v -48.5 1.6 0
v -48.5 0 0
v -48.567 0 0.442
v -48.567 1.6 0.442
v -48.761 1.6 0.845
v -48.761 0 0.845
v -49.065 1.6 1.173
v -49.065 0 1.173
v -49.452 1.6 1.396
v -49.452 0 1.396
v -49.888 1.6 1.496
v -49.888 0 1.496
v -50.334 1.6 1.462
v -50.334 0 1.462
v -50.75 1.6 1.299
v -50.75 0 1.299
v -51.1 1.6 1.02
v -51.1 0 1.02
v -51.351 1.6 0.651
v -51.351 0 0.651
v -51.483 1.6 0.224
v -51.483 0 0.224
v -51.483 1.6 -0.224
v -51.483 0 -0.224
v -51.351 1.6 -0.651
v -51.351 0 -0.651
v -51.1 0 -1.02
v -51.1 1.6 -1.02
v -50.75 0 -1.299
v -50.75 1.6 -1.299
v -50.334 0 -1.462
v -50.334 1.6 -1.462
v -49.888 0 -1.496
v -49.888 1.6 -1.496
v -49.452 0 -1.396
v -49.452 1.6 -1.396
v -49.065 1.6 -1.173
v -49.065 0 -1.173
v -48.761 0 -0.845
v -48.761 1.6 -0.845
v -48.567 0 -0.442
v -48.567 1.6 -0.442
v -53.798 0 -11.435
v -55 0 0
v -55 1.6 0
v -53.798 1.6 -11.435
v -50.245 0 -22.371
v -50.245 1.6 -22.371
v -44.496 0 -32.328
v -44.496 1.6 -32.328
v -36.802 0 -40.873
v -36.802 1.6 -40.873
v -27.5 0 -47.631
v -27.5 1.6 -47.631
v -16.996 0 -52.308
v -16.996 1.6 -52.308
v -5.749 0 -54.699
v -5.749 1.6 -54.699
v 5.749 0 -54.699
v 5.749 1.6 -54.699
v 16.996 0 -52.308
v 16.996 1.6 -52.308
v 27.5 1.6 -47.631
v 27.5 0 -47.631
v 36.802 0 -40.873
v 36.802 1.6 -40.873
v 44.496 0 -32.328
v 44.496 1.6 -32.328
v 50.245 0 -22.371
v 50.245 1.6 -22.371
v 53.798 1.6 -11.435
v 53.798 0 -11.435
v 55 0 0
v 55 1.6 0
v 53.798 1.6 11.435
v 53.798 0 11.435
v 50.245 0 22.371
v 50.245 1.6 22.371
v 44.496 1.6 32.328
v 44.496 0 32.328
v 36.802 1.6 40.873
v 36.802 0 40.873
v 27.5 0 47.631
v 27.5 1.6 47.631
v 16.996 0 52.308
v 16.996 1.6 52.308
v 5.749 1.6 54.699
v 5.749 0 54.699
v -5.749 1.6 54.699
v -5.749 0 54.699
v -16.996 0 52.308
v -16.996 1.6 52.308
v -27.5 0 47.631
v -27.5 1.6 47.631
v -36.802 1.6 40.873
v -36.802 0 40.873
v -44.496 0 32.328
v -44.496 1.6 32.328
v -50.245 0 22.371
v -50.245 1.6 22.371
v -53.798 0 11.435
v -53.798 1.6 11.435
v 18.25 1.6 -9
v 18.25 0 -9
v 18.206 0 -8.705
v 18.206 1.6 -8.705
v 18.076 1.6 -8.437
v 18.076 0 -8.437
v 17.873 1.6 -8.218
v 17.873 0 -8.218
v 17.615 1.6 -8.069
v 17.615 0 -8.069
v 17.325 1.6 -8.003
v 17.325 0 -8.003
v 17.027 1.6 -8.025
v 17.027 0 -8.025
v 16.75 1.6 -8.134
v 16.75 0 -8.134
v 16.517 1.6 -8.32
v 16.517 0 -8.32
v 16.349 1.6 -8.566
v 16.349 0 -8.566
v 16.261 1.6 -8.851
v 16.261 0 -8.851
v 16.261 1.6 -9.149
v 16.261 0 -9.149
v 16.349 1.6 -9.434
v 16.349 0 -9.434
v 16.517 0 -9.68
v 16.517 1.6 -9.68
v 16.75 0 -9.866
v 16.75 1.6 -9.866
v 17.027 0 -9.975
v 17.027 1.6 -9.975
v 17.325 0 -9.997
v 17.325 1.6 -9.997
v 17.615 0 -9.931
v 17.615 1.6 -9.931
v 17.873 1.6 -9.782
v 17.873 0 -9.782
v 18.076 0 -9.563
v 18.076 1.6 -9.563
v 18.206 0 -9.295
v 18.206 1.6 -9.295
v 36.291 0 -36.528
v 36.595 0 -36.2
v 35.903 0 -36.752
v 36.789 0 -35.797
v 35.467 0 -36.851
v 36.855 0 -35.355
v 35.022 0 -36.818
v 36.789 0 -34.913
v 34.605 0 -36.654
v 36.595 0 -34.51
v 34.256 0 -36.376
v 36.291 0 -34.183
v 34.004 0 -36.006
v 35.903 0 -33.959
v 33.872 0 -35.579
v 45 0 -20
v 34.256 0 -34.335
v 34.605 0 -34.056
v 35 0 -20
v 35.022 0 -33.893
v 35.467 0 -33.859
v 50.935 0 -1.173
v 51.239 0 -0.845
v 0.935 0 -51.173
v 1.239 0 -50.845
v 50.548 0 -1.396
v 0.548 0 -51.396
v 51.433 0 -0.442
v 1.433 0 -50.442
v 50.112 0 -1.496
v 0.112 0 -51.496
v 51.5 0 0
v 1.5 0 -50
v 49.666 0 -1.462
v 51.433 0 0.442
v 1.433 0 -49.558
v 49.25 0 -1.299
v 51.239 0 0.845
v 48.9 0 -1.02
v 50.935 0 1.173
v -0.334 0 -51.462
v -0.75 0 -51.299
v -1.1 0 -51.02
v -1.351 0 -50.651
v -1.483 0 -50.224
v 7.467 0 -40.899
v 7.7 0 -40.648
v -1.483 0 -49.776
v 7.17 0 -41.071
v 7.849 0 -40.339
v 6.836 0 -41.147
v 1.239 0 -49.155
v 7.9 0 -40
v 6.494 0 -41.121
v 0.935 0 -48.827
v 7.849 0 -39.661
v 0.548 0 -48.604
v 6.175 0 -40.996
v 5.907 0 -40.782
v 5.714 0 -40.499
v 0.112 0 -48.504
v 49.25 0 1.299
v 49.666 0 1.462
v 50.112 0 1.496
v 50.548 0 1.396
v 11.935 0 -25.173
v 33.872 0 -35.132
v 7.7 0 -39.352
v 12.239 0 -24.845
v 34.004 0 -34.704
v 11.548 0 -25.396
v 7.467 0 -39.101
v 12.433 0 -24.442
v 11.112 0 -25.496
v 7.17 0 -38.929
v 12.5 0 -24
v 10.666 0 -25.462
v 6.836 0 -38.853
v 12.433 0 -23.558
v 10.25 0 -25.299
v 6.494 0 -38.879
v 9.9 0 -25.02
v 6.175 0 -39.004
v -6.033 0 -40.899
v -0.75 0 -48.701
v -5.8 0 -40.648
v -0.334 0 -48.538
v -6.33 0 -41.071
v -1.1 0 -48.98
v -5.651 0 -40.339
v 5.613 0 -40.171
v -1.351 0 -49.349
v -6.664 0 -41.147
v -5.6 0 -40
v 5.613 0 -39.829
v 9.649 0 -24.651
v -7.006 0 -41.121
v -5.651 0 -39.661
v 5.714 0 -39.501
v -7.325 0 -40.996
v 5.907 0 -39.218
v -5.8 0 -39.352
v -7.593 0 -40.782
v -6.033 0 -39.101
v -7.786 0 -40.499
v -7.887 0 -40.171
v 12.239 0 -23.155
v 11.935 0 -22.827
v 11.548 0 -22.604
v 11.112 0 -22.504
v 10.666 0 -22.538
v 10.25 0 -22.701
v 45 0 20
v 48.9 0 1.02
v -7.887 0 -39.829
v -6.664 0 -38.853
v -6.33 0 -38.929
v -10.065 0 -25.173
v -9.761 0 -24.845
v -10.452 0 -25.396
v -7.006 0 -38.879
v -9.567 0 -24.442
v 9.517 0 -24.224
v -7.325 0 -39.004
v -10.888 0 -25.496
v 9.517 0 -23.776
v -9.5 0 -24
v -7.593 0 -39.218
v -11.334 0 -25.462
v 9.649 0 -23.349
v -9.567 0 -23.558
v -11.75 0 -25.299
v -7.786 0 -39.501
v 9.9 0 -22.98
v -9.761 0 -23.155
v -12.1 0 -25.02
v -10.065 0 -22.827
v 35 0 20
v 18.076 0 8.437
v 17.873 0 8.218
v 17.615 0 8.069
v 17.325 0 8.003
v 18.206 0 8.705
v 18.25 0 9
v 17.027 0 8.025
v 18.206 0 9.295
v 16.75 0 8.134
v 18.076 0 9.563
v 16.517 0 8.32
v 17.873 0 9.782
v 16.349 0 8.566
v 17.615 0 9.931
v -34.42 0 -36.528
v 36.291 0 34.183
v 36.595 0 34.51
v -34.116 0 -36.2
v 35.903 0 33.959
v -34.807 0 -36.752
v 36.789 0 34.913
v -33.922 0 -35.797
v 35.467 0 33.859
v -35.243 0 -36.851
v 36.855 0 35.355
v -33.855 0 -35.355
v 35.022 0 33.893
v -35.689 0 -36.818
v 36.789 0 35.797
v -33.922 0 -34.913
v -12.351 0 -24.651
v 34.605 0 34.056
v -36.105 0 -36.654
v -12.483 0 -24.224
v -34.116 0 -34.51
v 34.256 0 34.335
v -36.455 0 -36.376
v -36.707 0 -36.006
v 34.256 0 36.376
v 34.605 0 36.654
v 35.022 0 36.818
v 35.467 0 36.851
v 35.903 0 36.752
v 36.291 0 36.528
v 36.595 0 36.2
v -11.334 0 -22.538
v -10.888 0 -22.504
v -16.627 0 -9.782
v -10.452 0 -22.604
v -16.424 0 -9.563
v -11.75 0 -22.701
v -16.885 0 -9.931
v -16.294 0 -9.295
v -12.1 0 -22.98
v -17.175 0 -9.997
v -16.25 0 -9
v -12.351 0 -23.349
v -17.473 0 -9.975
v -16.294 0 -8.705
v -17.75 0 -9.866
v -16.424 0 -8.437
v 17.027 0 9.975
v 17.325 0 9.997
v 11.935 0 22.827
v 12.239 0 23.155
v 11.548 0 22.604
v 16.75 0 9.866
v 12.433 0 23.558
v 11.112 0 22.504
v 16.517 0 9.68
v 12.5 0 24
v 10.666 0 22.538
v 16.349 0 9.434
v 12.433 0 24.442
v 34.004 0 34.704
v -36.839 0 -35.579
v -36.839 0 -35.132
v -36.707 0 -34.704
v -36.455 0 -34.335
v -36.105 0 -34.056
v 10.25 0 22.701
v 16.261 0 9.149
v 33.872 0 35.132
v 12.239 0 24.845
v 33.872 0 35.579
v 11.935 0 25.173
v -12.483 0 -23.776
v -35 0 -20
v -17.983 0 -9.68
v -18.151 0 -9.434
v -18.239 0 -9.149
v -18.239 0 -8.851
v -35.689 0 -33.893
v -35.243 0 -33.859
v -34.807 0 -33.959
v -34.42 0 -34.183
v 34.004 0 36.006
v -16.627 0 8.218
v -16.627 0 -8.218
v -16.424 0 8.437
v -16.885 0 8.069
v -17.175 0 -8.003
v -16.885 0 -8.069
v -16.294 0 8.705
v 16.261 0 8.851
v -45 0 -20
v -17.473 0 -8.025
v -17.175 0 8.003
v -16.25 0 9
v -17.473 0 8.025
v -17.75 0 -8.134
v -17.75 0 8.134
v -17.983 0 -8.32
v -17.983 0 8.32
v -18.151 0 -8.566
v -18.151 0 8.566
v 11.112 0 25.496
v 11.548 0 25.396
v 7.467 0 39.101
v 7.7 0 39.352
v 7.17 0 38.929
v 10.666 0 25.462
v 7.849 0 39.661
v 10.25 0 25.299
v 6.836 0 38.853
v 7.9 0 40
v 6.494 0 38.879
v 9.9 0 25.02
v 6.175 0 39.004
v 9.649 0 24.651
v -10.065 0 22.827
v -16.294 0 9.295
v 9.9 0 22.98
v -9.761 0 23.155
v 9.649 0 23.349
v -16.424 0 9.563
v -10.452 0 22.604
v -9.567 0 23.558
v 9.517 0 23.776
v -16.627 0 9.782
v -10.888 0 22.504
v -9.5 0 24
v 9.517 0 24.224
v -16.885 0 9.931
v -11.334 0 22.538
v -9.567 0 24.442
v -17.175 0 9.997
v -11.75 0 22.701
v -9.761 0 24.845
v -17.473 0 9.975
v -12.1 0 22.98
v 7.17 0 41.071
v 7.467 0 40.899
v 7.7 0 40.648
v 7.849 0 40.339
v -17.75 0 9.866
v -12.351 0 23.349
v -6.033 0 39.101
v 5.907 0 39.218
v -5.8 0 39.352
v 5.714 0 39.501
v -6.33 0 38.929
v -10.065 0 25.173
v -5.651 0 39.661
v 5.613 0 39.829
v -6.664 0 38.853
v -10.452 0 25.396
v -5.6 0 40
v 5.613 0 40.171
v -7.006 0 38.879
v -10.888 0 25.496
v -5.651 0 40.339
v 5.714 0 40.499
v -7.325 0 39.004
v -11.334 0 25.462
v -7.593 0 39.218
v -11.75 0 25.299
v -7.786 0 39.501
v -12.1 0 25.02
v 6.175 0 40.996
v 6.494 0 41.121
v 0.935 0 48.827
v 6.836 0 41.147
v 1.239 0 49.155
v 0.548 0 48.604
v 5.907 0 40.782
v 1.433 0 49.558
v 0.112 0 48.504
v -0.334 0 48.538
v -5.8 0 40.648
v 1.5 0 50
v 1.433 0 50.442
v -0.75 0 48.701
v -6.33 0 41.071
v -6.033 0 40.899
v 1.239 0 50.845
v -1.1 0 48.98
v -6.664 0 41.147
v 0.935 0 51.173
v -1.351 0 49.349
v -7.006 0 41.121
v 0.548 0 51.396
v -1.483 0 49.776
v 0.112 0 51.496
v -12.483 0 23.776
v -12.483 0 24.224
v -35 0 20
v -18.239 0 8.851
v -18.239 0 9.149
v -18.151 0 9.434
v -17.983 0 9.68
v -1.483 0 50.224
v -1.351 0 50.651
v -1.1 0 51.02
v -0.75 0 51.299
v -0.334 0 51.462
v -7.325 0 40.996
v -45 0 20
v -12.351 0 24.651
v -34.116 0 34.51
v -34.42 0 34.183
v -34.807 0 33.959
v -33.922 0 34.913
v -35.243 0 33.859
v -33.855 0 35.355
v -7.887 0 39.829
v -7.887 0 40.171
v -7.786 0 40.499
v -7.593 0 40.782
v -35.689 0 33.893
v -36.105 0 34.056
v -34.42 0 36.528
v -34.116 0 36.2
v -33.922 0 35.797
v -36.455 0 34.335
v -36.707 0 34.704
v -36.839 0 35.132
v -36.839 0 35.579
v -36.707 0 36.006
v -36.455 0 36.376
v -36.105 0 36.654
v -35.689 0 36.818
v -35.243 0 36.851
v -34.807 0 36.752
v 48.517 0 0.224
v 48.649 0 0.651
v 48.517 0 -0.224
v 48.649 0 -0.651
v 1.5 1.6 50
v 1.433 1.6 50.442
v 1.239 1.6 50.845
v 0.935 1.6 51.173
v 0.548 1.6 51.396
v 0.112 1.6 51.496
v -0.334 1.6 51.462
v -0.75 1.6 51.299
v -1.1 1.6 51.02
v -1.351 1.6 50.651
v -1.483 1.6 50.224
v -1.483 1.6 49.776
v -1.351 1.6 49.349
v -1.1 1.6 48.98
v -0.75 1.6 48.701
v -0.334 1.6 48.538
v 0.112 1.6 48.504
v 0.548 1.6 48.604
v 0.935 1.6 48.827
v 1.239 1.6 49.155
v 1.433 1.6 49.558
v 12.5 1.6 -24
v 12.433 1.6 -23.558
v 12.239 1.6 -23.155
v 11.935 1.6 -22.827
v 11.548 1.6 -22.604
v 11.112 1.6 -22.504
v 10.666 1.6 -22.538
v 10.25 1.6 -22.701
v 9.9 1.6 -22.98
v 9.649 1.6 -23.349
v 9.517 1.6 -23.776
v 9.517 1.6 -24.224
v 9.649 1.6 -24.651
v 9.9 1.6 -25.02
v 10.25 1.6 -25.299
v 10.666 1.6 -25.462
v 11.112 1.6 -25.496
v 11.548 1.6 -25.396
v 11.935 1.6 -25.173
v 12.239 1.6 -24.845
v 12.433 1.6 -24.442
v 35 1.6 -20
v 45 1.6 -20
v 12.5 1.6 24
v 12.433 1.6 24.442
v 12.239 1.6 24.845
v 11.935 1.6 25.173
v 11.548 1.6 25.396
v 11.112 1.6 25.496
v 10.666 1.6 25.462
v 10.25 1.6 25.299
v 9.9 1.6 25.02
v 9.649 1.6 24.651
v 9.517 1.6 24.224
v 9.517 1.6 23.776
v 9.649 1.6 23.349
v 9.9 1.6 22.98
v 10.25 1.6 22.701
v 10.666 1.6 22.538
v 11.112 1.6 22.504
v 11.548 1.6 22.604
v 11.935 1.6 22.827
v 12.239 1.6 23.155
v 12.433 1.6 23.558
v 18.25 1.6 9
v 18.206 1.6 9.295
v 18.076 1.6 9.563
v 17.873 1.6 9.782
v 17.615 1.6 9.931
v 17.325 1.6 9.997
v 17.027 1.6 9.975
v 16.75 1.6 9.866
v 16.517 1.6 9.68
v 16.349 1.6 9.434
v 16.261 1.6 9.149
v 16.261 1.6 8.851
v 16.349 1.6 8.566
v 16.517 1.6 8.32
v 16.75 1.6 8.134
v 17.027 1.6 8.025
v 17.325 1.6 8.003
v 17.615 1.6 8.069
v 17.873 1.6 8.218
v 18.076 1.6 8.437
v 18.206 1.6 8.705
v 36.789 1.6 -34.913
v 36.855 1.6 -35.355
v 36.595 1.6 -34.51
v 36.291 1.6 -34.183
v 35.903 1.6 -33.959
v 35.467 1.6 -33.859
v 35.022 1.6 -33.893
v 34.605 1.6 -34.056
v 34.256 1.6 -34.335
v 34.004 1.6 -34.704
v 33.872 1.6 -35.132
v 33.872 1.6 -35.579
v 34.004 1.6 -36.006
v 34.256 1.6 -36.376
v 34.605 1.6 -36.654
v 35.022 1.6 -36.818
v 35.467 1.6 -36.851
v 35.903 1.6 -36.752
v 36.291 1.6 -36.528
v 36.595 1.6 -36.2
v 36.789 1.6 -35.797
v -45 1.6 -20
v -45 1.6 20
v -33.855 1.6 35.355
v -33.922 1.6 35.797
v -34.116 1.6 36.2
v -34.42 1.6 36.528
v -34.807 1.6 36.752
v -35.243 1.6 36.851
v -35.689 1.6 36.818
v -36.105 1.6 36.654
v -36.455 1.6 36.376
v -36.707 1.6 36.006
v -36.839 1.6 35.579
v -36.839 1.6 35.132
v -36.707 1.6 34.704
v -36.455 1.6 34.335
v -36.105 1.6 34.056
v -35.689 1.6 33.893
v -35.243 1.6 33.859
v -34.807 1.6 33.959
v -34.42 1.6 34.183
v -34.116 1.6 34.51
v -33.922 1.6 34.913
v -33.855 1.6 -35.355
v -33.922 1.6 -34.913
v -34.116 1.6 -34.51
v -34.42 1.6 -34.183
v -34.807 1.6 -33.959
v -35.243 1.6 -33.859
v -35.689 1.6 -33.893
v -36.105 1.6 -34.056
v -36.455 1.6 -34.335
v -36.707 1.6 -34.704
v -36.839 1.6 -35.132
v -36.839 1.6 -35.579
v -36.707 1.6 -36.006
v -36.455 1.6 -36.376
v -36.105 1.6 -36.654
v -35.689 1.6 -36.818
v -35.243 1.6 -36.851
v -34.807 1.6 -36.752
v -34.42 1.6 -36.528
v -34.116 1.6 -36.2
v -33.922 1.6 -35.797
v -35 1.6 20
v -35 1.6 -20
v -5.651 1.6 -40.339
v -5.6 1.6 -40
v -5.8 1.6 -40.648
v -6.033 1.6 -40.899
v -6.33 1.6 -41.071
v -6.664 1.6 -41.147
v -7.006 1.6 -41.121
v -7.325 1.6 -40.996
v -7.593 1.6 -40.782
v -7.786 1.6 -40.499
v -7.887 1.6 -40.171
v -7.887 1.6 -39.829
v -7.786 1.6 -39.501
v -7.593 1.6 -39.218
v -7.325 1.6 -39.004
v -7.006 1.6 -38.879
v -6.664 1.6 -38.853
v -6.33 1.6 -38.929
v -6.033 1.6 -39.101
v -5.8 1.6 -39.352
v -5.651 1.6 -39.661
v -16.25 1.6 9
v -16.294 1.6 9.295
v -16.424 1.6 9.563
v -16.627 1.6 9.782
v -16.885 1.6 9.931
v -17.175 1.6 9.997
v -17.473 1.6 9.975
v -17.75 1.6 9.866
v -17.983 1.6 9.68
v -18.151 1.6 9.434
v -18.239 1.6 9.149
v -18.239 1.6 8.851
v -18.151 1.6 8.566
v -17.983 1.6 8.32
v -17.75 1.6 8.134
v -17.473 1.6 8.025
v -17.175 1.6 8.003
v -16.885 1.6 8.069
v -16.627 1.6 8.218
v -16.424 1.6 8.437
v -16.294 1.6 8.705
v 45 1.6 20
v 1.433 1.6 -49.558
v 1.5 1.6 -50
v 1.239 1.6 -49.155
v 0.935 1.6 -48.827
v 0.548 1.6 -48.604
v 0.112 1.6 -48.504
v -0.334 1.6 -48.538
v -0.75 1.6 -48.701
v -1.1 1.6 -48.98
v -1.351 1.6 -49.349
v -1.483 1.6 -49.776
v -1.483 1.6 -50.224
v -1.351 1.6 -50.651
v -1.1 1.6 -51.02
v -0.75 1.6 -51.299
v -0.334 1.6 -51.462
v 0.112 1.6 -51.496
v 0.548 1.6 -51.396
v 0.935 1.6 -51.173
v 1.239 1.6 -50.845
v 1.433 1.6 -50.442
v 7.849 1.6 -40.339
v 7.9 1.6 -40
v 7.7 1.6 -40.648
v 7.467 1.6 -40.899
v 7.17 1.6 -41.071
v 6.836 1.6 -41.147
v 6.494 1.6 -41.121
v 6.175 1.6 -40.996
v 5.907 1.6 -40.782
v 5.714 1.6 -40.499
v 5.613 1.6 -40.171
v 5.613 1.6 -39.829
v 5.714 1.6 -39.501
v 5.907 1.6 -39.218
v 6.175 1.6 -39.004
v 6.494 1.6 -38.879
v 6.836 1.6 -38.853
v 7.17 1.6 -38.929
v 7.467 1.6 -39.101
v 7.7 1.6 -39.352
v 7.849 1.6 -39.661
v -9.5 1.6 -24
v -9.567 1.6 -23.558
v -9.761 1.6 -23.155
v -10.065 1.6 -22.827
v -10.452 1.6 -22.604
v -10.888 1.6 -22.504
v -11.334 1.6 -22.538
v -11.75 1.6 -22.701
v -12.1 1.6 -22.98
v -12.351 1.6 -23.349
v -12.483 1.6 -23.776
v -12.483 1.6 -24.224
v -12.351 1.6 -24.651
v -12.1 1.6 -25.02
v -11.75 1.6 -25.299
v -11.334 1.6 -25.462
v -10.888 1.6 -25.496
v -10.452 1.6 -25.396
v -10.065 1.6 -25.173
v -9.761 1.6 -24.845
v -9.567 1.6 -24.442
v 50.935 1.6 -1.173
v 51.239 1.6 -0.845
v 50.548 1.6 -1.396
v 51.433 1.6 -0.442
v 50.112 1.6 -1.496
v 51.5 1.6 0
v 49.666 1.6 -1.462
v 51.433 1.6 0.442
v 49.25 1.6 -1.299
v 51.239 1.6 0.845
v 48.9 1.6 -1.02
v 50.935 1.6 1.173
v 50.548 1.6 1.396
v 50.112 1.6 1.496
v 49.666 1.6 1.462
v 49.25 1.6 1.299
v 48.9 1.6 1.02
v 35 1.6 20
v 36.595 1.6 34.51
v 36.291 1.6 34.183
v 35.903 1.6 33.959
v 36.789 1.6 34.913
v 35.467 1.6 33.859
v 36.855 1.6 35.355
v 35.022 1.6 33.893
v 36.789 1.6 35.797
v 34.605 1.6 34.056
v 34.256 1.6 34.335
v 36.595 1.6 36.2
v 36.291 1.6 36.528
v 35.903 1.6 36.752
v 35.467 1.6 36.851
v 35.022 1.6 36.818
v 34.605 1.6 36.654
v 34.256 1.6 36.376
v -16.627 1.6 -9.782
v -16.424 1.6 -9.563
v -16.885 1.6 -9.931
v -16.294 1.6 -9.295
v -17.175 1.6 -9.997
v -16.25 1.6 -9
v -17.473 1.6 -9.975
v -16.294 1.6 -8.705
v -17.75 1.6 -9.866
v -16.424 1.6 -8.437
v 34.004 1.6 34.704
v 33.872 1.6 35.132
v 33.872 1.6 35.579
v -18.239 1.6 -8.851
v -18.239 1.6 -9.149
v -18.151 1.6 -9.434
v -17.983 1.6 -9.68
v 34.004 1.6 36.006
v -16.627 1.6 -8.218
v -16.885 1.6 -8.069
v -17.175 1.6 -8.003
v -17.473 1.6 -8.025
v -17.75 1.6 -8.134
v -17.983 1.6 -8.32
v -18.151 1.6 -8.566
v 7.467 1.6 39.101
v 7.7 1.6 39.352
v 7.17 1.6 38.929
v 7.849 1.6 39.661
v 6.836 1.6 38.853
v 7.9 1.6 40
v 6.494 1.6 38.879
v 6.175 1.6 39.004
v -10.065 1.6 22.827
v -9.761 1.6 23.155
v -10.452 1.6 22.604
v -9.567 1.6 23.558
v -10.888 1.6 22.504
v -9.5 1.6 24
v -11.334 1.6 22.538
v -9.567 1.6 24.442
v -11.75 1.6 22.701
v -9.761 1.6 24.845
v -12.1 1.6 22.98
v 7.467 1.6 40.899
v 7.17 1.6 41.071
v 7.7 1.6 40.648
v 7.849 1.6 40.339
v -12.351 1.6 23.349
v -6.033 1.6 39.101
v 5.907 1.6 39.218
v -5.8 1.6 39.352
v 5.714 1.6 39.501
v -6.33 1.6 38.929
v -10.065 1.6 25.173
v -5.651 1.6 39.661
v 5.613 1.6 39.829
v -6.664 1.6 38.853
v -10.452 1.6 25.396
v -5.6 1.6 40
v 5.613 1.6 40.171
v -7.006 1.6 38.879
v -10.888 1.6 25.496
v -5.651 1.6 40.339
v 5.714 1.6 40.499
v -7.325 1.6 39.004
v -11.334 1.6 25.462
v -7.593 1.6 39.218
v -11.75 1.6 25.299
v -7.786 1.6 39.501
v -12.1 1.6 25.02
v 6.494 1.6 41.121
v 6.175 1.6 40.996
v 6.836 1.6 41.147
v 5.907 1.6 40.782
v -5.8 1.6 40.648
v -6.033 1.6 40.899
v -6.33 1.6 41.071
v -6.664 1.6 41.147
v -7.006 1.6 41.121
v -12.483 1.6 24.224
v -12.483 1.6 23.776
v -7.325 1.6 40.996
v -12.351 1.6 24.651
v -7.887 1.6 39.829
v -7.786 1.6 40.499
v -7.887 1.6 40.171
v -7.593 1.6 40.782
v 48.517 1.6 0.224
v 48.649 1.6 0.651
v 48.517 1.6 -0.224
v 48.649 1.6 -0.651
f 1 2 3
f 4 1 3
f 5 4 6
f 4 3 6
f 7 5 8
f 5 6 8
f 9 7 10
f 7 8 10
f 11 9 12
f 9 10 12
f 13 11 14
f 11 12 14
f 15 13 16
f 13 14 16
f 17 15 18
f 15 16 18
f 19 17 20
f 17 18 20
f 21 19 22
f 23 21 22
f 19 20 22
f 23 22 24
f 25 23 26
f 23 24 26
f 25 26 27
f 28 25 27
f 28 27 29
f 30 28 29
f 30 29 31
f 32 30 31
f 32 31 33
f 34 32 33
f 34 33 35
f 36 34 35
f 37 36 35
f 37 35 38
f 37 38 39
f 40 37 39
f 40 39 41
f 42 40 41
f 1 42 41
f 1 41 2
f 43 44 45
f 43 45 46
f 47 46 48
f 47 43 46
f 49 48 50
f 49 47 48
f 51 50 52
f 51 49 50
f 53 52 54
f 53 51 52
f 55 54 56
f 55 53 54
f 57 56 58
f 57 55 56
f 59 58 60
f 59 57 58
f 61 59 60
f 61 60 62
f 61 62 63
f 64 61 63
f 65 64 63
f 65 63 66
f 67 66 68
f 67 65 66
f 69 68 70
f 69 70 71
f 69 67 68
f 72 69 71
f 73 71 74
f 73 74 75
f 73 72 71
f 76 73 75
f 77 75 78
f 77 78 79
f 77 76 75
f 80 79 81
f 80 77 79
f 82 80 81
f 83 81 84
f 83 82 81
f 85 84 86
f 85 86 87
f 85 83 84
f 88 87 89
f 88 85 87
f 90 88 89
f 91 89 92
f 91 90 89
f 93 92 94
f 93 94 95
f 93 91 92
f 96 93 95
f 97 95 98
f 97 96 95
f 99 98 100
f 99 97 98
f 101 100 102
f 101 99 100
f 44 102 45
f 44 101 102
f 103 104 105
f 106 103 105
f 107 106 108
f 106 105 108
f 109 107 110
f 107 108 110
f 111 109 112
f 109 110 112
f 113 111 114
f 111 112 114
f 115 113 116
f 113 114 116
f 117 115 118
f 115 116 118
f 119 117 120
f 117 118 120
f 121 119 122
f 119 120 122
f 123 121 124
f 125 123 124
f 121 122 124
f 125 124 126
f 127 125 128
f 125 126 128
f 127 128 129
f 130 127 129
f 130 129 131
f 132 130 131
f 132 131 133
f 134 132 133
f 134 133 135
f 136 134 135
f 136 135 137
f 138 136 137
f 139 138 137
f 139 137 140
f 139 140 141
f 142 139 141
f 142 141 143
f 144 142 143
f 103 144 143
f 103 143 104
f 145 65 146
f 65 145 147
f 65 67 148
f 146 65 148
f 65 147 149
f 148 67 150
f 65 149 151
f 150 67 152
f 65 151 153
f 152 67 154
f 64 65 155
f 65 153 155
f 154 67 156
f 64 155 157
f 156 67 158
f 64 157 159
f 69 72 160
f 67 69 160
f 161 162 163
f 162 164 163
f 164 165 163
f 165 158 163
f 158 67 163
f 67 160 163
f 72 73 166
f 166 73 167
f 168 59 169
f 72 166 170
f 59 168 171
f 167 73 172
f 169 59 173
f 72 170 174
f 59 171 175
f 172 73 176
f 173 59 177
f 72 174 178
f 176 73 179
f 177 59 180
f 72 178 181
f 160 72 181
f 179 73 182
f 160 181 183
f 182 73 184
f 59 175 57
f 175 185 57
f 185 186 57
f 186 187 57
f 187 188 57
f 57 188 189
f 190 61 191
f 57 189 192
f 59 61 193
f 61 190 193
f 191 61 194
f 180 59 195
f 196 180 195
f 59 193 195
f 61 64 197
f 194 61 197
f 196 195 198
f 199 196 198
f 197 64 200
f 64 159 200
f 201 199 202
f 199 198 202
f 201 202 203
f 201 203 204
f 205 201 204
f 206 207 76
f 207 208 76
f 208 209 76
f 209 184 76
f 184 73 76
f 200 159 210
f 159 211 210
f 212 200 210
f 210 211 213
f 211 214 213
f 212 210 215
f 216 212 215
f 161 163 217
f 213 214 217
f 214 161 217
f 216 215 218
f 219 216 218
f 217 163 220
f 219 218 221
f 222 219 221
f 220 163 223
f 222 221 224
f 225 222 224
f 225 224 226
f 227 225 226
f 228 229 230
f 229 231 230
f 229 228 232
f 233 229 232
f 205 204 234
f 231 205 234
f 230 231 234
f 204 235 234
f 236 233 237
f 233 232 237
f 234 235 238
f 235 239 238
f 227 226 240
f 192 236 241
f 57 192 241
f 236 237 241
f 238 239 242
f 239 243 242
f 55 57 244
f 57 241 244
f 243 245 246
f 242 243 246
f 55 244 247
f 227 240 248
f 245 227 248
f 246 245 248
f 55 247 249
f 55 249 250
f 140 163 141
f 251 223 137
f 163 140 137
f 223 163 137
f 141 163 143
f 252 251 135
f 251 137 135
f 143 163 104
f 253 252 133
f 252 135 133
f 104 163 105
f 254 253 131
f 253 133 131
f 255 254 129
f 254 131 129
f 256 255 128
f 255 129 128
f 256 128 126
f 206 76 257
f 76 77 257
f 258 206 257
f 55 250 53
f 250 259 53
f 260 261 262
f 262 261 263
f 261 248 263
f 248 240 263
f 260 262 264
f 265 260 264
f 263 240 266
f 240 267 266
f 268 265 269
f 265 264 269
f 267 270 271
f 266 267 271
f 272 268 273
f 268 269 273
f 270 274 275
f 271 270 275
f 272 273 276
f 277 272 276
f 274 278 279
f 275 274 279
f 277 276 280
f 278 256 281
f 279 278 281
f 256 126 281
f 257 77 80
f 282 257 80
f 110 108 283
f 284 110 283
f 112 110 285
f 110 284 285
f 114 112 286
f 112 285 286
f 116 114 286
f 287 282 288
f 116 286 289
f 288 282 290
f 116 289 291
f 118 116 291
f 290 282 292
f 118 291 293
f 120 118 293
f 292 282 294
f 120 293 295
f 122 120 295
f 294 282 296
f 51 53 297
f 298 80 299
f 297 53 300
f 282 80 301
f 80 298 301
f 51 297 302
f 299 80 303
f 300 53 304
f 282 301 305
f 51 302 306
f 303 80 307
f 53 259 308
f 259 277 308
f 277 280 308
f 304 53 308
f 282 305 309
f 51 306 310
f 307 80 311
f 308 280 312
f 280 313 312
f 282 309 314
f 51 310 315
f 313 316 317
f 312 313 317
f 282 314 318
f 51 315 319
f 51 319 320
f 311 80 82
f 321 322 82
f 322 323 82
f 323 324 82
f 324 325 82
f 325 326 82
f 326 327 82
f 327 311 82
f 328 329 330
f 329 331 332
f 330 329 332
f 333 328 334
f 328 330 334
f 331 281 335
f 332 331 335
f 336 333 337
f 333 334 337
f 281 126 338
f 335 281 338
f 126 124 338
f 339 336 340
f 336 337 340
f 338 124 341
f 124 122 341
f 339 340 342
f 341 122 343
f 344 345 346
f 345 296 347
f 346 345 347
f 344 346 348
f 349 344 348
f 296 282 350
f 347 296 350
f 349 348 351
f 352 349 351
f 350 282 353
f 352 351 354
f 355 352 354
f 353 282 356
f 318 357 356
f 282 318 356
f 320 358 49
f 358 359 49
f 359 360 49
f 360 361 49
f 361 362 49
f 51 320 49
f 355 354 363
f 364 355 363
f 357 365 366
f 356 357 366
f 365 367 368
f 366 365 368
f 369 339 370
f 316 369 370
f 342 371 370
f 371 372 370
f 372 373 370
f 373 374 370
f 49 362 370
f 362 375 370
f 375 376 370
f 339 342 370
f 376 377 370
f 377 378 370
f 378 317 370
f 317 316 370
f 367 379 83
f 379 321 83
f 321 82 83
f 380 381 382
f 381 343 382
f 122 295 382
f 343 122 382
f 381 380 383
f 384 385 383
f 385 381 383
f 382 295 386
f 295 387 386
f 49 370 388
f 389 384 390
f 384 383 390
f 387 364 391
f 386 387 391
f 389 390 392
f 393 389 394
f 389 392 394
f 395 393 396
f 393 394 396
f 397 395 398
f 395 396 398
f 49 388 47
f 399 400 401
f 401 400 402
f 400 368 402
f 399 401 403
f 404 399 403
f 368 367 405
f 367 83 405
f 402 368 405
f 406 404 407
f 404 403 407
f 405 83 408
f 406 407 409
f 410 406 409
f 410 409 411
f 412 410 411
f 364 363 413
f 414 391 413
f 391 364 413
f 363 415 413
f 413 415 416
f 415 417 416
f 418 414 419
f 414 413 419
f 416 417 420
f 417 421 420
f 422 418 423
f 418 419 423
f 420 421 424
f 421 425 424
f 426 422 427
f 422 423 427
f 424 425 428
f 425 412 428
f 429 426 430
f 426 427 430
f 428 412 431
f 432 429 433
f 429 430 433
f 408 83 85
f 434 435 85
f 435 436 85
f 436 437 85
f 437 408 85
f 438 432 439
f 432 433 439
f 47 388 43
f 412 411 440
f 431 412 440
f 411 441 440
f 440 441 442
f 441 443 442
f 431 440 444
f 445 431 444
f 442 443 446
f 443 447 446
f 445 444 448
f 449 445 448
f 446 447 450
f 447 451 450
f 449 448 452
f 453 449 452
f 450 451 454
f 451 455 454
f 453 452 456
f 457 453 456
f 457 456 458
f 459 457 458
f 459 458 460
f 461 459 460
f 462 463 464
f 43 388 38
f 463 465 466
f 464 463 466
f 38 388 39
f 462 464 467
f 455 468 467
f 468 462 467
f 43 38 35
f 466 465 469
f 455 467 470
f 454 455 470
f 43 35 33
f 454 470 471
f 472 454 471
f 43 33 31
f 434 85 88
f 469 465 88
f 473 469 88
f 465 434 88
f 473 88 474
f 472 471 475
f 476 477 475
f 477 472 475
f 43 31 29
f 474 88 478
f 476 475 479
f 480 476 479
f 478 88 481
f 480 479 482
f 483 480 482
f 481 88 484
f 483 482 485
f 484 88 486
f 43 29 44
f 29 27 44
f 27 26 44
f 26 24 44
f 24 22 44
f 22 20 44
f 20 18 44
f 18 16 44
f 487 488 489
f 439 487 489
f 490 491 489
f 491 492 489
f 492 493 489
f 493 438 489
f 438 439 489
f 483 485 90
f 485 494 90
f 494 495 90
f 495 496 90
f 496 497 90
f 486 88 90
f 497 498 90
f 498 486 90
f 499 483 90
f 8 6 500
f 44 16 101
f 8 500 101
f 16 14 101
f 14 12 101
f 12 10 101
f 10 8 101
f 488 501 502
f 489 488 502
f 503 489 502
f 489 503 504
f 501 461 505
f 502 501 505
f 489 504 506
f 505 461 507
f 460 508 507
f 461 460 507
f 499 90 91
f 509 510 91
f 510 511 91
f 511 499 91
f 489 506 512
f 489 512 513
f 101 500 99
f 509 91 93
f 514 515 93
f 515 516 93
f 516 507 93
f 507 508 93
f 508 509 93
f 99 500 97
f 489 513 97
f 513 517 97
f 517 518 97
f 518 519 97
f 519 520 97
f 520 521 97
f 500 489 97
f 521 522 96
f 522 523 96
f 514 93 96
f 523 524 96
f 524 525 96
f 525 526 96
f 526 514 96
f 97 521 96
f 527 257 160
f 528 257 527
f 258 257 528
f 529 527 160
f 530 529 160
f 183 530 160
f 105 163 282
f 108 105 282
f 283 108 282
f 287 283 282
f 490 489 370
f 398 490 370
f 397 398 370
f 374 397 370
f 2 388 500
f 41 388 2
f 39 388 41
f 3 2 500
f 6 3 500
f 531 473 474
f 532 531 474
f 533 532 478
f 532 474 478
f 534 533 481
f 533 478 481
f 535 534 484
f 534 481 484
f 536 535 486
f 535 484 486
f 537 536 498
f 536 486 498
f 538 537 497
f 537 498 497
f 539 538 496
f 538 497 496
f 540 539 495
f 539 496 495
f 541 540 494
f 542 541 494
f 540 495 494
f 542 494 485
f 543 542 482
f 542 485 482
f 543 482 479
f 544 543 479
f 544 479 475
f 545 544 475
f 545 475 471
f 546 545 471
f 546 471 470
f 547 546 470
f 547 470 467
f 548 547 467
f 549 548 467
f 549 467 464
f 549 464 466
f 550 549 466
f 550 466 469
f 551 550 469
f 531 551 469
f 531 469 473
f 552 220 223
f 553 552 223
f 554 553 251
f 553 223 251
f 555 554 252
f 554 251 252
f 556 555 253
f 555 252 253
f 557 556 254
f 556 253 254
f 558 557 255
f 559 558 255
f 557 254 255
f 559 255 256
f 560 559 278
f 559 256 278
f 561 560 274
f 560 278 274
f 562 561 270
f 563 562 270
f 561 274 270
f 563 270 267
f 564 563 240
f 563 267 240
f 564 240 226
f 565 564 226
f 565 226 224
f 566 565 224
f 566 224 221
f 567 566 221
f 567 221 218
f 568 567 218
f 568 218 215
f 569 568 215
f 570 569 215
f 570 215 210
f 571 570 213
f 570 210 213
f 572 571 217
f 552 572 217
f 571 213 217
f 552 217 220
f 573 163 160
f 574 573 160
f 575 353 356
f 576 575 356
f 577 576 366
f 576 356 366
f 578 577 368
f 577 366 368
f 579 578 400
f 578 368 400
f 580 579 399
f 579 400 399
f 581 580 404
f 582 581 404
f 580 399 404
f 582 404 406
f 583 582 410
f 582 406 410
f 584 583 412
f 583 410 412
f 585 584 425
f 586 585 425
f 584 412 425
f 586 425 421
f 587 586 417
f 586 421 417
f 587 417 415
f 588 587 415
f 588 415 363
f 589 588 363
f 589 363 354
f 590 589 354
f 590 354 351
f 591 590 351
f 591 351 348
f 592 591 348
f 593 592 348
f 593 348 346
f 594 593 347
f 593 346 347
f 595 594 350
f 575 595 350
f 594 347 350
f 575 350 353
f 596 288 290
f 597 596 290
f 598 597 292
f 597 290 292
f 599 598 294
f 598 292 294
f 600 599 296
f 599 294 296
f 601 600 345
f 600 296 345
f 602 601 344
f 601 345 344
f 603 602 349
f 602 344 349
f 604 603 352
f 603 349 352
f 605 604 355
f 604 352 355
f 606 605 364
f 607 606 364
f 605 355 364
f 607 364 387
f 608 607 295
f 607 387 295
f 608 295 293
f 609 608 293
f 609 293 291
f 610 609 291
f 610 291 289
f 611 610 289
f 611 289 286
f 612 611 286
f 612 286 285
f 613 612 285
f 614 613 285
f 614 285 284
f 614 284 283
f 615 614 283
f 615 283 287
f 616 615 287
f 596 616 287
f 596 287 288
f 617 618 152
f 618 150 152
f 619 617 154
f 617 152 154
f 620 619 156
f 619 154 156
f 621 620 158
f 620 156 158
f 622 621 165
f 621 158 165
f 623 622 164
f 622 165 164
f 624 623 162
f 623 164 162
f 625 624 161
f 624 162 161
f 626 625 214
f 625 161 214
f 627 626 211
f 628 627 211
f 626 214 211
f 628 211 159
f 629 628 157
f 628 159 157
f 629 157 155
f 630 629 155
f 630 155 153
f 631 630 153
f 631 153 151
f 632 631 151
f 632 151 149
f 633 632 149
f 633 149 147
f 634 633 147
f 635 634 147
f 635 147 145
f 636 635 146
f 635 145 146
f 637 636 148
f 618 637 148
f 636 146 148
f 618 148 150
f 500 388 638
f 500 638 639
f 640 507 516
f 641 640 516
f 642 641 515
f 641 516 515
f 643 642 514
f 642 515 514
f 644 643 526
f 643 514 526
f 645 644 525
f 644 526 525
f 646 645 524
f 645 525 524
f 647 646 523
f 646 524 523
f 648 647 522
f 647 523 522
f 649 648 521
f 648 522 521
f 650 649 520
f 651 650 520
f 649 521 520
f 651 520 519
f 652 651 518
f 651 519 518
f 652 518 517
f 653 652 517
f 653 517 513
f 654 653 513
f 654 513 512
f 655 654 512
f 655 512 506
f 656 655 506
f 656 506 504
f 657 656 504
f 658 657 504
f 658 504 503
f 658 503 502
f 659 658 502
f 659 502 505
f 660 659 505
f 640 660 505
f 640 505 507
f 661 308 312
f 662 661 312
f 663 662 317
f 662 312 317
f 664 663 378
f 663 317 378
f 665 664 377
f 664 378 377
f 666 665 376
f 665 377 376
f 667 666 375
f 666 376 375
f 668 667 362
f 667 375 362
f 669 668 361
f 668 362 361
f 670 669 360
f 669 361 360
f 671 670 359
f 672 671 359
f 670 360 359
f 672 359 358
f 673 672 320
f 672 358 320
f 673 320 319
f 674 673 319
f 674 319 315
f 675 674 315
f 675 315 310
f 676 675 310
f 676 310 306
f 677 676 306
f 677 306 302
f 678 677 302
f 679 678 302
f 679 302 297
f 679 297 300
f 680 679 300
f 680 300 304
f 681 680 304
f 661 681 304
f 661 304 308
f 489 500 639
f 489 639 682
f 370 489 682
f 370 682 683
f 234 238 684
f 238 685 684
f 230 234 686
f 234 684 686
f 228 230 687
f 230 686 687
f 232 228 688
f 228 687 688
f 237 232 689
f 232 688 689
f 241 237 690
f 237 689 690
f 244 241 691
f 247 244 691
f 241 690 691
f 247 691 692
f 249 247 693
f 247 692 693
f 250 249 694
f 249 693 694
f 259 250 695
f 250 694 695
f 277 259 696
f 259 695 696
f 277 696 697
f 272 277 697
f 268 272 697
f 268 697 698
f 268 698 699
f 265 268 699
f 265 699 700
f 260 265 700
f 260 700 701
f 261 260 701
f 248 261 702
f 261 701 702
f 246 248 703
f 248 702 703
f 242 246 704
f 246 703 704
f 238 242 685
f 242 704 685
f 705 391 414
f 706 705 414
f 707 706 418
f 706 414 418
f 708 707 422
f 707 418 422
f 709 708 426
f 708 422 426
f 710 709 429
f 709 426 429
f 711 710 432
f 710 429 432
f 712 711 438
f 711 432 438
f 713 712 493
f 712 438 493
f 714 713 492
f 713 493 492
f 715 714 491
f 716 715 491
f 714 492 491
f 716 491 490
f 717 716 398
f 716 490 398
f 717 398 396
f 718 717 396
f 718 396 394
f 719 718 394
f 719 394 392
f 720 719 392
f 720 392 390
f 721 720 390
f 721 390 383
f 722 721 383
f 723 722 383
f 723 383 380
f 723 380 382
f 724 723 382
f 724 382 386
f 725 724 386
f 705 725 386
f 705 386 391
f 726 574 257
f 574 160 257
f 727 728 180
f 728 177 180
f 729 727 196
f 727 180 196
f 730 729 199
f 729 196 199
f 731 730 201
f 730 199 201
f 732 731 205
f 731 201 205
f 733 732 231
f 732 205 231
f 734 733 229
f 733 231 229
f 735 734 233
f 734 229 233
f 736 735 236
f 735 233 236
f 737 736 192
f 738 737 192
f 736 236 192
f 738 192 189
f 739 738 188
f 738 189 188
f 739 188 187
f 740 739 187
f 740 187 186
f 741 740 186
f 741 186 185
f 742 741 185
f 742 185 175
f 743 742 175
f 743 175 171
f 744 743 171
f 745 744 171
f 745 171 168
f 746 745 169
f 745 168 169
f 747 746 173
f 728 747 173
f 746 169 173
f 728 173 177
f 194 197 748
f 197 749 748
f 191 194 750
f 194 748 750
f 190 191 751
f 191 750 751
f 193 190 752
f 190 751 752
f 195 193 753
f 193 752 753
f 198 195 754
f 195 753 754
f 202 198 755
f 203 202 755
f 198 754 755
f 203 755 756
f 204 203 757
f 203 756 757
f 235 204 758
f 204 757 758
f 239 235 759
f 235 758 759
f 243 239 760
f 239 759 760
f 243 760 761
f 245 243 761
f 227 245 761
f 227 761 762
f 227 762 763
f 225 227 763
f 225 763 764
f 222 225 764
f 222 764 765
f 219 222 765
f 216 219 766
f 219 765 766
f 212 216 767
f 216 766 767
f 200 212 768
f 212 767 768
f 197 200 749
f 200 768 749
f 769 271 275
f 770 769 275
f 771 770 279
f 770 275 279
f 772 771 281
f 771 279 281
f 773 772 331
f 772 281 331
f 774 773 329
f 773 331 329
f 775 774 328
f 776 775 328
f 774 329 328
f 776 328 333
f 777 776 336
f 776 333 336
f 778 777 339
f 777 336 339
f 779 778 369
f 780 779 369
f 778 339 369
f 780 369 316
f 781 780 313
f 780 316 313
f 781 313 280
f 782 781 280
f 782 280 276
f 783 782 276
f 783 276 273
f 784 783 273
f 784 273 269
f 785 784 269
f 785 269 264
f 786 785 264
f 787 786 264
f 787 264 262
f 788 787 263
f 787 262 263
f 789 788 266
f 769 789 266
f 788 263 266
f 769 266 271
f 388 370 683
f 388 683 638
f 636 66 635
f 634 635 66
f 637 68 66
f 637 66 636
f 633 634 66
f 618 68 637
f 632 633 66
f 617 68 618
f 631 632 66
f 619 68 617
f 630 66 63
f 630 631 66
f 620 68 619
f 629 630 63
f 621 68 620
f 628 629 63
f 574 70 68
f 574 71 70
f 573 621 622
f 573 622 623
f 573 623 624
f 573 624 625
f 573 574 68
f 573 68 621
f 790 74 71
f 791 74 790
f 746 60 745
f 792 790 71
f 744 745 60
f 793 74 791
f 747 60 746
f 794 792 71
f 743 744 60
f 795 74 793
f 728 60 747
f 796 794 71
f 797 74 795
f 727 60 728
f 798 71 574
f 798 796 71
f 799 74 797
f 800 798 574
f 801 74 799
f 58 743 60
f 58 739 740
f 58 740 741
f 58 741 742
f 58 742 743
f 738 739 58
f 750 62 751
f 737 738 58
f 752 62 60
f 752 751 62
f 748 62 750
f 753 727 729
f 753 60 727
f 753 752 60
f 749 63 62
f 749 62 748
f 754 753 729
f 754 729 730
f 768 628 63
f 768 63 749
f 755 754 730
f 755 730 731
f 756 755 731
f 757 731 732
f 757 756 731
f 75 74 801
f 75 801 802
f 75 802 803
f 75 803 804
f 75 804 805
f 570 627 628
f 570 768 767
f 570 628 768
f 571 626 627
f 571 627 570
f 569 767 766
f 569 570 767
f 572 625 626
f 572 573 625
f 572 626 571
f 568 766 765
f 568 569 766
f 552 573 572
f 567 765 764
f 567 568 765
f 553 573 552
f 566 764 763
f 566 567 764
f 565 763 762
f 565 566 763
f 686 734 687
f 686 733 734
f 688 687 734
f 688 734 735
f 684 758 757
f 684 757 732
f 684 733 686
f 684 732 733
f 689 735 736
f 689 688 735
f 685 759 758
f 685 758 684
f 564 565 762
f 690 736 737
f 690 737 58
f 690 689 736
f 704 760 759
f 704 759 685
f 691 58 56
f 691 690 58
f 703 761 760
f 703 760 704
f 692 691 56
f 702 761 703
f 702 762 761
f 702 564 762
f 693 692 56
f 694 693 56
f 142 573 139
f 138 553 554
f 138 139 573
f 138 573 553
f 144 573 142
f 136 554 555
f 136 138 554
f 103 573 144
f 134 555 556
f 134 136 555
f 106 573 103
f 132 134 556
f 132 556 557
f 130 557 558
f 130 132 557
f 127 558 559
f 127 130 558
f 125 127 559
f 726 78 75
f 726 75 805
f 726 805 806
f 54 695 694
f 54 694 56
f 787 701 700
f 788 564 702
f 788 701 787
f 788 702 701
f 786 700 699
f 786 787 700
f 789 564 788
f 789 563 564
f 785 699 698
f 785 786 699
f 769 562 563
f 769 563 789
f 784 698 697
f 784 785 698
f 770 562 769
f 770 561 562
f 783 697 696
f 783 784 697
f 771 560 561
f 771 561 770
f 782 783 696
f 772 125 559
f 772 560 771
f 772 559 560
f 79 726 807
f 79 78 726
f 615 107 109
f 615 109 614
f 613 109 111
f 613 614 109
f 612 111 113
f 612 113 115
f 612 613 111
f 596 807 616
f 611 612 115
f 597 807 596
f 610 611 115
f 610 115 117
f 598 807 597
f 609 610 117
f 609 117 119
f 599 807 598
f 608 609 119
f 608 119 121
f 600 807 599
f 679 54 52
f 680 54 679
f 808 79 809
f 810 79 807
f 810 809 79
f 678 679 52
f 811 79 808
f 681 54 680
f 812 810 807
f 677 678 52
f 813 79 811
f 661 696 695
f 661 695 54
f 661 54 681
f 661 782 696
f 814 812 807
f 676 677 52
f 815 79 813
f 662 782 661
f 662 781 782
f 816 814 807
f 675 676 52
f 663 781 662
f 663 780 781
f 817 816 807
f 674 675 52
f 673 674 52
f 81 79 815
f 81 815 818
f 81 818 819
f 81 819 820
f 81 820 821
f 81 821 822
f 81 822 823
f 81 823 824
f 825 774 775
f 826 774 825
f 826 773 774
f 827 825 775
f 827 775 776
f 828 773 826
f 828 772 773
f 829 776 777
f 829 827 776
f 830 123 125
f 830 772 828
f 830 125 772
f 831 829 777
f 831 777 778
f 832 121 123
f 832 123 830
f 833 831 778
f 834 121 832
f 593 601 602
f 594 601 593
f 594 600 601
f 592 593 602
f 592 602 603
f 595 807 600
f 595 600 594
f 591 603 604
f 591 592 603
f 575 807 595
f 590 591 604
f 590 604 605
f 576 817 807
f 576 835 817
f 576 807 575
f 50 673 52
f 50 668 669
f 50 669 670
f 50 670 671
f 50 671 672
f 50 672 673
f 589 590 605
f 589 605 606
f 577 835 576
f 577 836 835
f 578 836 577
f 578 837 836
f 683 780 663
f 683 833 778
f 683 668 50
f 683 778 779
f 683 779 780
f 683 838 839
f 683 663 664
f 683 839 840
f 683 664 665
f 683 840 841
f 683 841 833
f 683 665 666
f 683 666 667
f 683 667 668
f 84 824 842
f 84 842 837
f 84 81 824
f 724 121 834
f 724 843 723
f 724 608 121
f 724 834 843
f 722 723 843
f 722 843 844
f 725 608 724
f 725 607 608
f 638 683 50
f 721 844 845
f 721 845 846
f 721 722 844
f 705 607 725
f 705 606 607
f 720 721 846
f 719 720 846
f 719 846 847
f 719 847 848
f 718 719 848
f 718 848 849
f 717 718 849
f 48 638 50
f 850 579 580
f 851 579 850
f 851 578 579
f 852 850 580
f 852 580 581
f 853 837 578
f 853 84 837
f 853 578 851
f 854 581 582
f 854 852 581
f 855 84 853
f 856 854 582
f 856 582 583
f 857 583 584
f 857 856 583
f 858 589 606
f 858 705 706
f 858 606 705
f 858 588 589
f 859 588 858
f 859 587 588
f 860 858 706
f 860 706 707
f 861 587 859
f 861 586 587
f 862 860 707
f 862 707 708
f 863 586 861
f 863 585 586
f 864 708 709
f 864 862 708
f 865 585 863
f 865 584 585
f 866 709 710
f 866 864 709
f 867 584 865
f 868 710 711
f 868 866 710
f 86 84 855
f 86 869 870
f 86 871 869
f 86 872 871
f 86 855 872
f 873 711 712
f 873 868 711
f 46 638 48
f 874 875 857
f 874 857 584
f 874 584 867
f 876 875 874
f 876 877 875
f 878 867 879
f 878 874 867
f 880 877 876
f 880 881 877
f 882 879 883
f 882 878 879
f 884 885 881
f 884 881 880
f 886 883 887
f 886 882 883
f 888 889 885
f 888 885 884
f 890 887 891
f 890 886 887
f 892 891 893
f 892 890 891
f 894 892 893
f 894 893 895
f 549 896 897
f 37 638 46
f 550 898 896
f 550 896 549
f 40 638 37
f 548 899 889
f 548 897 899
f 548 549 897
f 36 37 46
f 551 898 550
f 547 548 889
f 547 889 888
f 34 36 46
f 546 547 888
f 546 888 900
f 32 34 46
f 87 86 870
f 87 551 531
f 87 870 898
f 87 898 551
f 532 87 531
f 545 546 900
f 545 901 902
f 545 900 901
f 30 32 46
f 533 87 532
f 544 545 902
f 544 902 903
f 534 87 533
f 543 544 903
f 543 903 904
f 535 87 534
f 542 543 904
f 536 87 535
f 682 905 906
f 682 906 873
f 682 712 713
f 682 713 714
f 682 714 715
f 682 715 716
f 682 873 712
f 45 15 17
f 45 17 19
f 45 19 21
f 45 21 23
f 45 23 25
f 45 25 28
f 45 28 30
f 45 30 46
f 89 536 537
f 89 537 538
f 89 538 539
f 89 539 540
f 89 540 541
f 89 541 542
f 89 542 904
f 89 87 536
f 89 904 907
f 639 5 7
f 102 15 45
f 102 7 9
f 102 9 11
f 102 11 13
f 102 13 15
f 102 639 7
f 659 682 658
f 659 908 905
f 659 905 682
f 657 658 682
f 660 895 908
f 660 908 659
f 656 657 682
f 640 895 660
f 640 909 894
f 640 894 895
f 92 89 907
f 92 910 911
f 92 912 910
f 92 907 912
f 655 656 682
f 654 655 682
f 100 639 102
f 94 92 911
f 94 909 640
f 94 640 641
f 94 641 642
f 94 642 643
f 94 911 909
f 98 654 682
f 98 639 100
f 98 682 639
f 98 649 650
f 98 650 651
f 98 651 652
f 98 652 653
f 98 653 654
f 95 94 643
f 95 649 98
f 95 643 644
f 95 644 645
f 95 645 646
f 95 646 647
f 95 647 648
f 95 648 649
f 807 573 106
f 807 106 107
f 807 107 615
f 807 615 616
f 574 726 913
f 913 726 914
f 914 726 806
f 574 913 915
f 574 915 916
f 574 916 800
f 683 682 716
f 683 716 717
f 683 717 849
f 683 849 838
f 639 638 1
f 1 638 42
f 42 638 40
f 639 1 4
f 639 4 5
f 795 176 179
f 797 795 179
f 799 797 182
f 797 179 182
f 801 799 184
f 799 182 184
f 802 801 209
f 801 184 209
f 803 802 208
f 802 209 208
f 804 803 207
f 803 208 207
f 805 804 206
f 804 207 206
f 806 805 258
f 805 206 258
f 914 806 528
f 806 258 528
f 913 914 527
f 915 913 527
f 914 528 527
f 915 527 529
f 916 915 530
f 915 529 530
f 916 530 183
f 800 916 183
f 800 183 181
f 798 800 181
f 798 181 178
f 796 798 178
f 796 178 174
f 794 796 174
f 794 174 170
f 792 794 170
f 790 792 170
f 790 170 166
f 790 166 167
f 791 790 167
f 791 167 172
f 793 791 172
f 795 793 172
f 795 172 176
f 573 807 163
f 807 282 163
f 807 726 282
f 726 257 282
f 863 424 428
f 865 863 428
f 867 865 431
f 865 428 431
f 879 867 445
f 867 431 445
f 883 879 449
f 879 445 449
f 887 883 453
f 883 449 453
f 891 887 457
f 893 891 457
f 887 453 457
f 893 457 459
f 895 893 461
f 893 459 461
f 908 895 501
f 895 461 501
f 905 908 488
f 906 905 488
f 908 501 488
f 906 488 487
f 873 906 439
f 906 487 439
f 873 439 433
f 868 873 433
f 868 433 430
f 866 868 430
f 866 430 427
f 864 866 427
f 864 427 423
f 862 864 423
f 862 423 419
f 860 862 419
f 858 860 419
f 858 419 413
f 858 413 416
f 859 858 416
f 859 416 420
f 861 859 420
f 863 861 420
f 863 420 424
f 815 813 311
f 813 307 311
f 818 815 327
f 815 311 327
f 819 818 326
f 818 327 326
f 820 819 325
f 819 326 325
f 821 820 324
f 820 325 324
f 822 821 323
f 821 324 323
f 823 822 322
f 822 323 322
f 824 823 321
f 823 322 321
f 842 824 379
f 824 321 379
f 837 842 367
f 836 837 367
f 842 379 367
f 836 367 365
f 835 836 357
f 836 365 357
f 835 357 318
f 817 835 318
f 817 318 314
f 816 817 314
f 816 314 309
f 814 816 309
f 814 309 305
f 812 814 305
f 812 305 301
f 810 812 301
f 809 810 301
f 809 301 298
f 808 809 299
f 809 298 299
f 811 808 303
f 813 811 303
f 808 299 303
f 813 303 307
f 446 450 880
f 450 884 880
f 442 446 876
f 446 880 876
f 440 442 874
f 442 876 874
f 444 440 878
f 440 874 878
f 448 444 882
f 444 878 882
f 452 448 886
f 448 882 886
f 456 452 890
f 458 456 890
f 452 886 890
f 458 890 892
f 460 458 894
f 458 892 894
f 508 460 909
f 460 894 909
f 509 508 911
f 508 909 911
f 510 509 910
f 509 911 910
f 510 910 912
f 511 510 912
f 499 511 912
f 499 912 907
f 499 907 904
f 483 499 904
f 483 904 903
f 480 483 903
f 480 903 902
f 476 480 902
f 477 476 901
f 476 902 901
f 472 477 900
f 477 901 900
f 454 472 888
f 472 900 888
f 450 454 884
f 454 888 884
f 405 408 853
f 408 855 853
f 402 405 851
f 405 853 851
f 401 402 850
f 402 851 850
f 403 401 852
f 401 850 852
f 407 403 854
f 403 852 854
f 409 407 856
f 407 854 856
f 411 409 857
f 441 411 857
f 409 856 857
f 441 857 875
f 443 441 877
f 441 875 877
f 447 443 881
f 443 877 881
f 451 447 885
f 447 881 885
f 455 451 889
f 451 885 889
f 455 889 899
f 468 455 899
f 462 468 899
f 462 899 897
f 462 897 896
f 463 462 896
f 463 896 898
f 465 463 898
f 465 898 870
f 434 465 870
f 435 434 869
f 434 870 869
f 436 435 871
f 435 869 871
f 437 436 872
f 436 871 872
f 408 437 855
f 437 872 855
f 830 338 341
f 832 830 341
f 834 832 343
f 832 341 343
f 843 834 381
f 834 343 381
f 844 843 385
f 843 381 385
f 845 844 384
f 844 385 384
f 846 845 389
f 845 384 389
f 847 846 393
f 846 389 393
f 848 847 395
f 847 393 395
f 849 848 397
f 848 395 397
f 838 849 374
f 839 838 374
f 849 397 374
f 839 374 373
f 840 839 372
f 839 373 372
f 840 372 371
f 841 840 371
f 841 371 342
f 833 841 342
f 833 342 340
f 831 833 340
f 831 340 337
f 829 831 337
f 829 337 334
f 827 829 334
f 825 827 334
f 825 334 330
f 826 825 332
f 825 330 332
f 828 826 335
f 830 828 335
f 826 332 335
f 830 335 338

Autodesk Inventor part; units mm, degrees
ref_plane "YZ Plane" through (0, 0, 0) normal (1, 0, 0) x (0, 1, 0)
ref_plane "XZ Plane" through (0, 0, 0) normal (0, 1, 0) x (-1, 0, 0)
ref_plane "XY Plane" through (0, 0, 0) normal (0, 0, 1) x (1, 0, 0)
sketch "Эскиз1" plane through (0, 0, 0) normal (0, 1, 0) x (-1, 0, 0)
  circle A0 centre (0, 0) radius 55
  line L0 (79.4555, 0) -> (-79.4555, 0)
  line L1 (0, -103.8803) -> (0, 88.3129)
  dimension "d0" = 110
extrude "Выдавливание1" add sketch "Эскиз1" along normal blind 1.6
sketch "Эскиз2" plane through (0, 0, 0) normal (0, -1, 0) x (1, 0, 0)
  circle A0 centre (0, 0) radius 55 projected
  line L0 (0, -103.8803) -> (0, 88.3129) projected
  line L1 (-79.4555, 0) -> (79.4555, 0) projected
  line L2 (11.5, -13.3) -> (23, -13.3)
  line L3 (23, -13.3) -> (23, 13.3)
  line L4 (23, 13.3) -> (11.5, 13.3)
  line L5 (11.5, 13.3) -> (11.5, -13.3)
  line L6 (35, -20) -> (45, -20)
  line L7 (45, -20) -> (45, 20)
  line L8 (45, 20) -> (35, 20)
  line L9 (35, 20) -> (35, -20)
  line L10 (17.25, -13.3) -> (17.25, 13.3)
  circle A1 centre (17.25, -9) radius 1
  circle A2 centre (17.25, 9) radius 1
  line L11 (3, 6) -> (33, 6)
  line L12 (33, 6) -> (33, -6)
  line L13 (33, -6) -> (3, -6)
  line L14 (3, -6) -> (3, 6)
  line L15 (-11.5, -13.3) -> (-23, -13.3)
  line L16 (-23, -13.3) -> (-23, 13.3)
  line L17 (-23, 13.3) -> (-11.5, 13.3)
  line L18 (-11.5, 13.3) -> (-11.5, -13.3)
  line L19 (-35, -20) -> (-45, -20)
  line L20 (-45, -20) -> (-45, 20)
  line L21 (-45, 20) -> (-35, 20)
  line L22 (-35, 20) -> (-35, -20)
  line L23 (-17.25, -13.3) -> (-17.25, 13.3)
  circle A3 centre (-17.25, -9) radius 1
  circle A4 centre (-17.25, 9) radius 1
  line L24 (-3, 6) -> (-33, 6)
  line L25 (-33, 6) -> (-33, -6)
  line L26 (-33, -6) -> (-3, -6)
  line L27 (-3, -6) -> (-3, 6)
  circle A5 centre (0, 0) radius 50
  circle A6 centre (0, -50) radius 1.5
  circle A7 centre (50, 0) radius 1.5
  circle A8 centre (0, 50) radius 1.5
  circle A9 centre (-50, 0) radius 1.5
  circle A10 centre (35.3553, -35.3553) radius 1.5
  circle A11 centre (50, 0) radius 1.5
  circle A12 centre (35.3553, 35.3553) radius 1.5
  circle A13 centre (0, 50) radius 1.5
  circle A14 centre (-35.3553, 35.3553) radius 1.5
  circle A15 centre (-50, 0) radius 1.5
  circle A16 centre (-35.3553, -35.3553) radius 1.5
  dimension "d6" = 11.5
  dimension "d7" = 26.6
  dimension "d9" = 10
  dimension "d10" = 40
  dimension "d11" = 45
  dimension "d12" = 12
  dimension "d13" = 2
  dimension "d14" = 18
  dimension "d15" = 2
  dimension "d16" = 30
  dimension "d17" = 12
  dimension "d18" = 2
  dimension "d21" = 100
  dimension "d22" = 3
  dimension "d23" = 3
  dimension "d25" = 3
  dimension "d26" = 3
  dimension "d30" = 360
extrude "Выдавливание2" cut sketch "Эскиз2" against normal blind 1.6 contours A7 A5 L1 | L1 A5 A7 | A8 A5 L0 | L0 A5 A8 | A6 A5 L0 | L0 A5 A6 | A5 A7 L1 | L1 A7 A5 | A9 A5 L1 | L1 A5 A9 | A5 A8 L0 | L0 A8 A5 | A5 A6 L0 | L0 A6 A5 | A12 A5 | A5 A12 | A10 A5 | A5 A10 | A5 A9 L1 | L1 A9 A5 | A14 A5 | A5 A14 | A16 A5 | A5 A16 | L7 L6 L9 L1 | L1 L9 L8 L7 | L20 L21 L22 L1 | L1 L22 L19 L20 | A3 L23 | L23 A3 | A4 L23 | L23 A4 | A1 L10 | L10 A1 | A2 L10 | L10 A2
sketch "Эскиз3" plane through (0, 0, 0) normal (0, -1, 0) x (1, 0, 0)
  circle A0 centre (50, 0) radius 1.5 projected
  circle A1 centre (-50, 0) radius 1.5 projected
  circle A2 centre (-17.25, 9) radius 1 projected
  line L0 (35, -20) -> (35, 20) projected
  line L1 (35, 20) -> (45, 20) projected
  line L2 (45, 20) -> (45, -20) projected
  line L3 (45, -20) -> (35, -20) projected
  line L4 (-35, -20) -> (-45, -20) projected
  line L5 (-45, -20) -> (-45, 20) projected
  line L6 (-45, 20) -> (-35, 20) projected
  line L7 (-35, 20) -> (-35, -20) projected
  circle A3 centre (-35.3553, 35.3553) radius 1.5 projected
  circle A4 centre (35.3553, -35.3553) radius 1.5 projected
  circle A5 centre (35.3553, 35.3553) radius 1.5 projected
  circle A6 centre (-35.3553, -35.3553) radius 1.5 projected
  circle A7 centre (17.25, 9) radius 1 projected
  circle A8 centre (17.25, -9) radius 1 projected
  circle A9 centre (-17.25, -9) radius 1 projected
  circle A10 centre (0, 50) radius 1.5 projected
  circle A11 centre (0, -50) radius 1.5 projected
  circle A12 centre (0, 0) radius 55 projected
  line L8 (-79.4555, 0) -> (79.4555, 0) projected
  line L9 (0, -103.8803) -> (0, 88.3129) projected
  circle A13 centre (0, 0) radius 50 projected
  circle A14 centre (-35.3553, -35.3553) radius 1.5 projected
  line L10 (23, 13.3) -> (11.5, 13.3) projected
  line L11 (-21.1, -39.0646) -> (21.1, -39.0646)
  line L12 (21.1, -39.0646) -> (21.1, 37.2354)
  line L13 (21.1, 37.2354) -> (-21.1, 37.2354)
  line L14 (-21.1, 37.2354) -> (-21.1, -39.0646)
  circle A15 centre (-11, -24) radius 1.5
  circle A16 centre (11, -24) radius 1.5
  circle A17 centre (11, 24) radius 1.5
  circle A18 centre (-11, 24) radius 1.5
  dimension "d34" = 76.3
  dimension "d35" = 42.2
  dimension "d37" = 3
  dimension "d38" = 3
  dimension "d39" = 3
  dimension "d40" = 3
  dimension "d42" = 22
  dimension "d43" = 48
extrude "Выдавливание3" cut sketch "Эскиз3" against normal blind 1.6 contours A15 | A16 | A17 | A18
sketch "Эскиз4" plane through (0, 1.6, 0) normal (0, 1, 0) x (1, 0, 0)
  circle A0 centre (-11, 24) radius 1.5 projected
  circle A1 centre (11, 24) radius 1.5 projected
  circle A2 centre (11, -24) radius 1.5 projected
  circle A3 centre (11, 24) radius 1.5 projected
  circle A4 centre (-11, -24) radius 1.5 projected
  circle A5 centre (-11, 24) radius 1.5 projected
  circle A6 centre (50, 0) radius 1.5 projected
  circle A7 centre (-50, 0) radius 1.5 projected
  circle A8 centre (-17.25, -9) radius 1 projected
  line L0 (45, -20) -> (35, -20) projected
  line L1 (35, -20) -> (35, 20) projected
  line L2 (35, 20) -> (45, 20) projected
  line L3 (45, 20) -> (45, -20) projected
  line L4 (-45, -20) -> (-45, 20) projected
  line L5 (-45, 20) -> (-35, 20) projected
  line L6 (-35, 20) -> (-35, -20) projected
  line L7 (-35, -20) -> (-45, -20) projected
  circle A9 centre (-35.3553, -35.3553) radius 1.5 projected
  circle A10 centre (35.3553, 35.3553) radius 1.5 projected
  circle A11 centre (35.3553, -35.3553) radius 1.5 projected
  circle A12 centre (-35.3553, 35.3553) radius 1.5 projected
  circle A13 centre (17.25, -9) radius 1 projected
  circle A14 centre (17.25, 9) radius 1 projected
  circle A15 centre (-17.25, 9) radius 1 projected
  circle A16 centre (0, -50) radius 1.5 projected
  circle A17 centre (0, 50) radius 1.5 projected
  circle A18 centre (0, 0) radius 55 projected
  line L8 (0, 103.8803) -> (0, -88.3129) projected
  line L9 (-79.4555, 0) -> (79.4555, 0) projected
  circle A19 centre (6.75, 40) radius 1.15
  circle A20 centre (-6.75, 40) radius 1.15
  circle A21 centre (6.75, -40) radius 1.15
  circle A22 centre (-6.75, -40) radius 1.15
  dimension "d48" = 2.3
  dimension "d51" = 13.5
  dimension "d52" = 10
  dimension "d54" = 2.3
  dimension "d56" = 13.5
  dimension "d57" = 10
extrude "Выдавливание4" cut sketch "Эскиз4" against normal blind 10 contours A19 | A20 | A21 | A22
properties part number "pcbCase"
